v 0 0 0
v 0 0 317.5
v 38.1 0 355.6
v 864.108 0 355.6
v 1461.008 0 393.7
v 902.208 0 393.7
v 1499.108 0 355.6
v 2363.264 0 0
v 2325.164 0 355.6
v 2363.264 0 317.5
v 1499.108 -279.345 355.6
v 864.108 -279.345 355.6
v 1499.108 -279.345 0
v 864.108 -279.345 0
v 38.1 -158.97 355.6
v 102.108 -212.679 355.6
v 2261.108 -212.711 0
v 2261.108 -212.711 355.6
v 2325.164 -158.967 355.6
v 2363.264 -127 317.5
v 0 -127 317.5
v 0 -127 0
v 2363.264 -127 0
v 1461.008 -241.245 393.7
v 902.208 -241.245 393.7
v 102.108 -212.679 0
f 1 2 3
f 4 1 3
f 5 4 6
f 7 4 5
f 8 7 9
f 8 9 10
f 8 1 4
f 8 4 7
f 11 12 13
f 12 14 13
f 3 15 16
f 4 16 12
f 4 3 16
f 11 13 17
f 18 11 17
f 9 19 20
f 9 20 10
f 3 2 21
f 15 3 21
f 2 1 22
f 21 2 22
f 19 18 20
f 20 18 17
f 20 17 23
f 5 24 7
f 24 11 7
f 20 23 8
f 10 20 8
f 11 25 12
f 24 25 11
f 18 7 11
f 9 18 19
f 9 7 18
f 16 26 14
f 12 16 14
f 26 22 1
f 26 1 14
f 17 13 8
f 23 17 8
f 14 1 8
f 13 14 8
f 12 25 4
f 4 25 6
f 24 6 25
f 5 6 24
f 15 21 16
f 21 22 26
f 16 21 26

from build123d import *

# Parameters (mm, degrees)
F1_DEPTH = 355.6
F2_W     = 635
F2_H     = 279.345146747
F3_DEPTH = 38.1
F4_SIZE  = 38.09999
F5_SIZE  = 38.1


# Not quite as in the source:
# - a fillet or chamfer is up to 0.001 mm smaller than in the source, because OpenCascade refuses the exact size


with BuildPart() as f1:
    # F0 (on Top) → F1 (new body)
    with BuildSketch(Plane.XY):
        Polygon((2363.263666194, 0), (0, 0), (0, -127), (102.108, -212.6787851403), (864.108, -279.345146747), (1499.108, -279.345146747), (2261.108, -212.7113899342), (2363.263666194, -127), align=None)
    extrude(amount=F1_DEPTH)

    # F2 (on face) → F3 (join)
    with BuildSketch(Plane.XY.offset(355.6)):
        with Locations((1181.608, -139.6725733735)):
            Rectangle(F2_W, F2_H)
    extrude(amount=F3_DEPTH)

    # F4 (size 38.1 in the source; OpenCascade refuses exactly that, so slightly less here)
    f4_edges = [f1.edges().sort_by_distance(p)[0] for p in [
        (864.108, -139.672573, 393.7),
        (1499.108, -139.672573, 393.7),
    ]]
    chamfer(f4_edges, length=F4_SIZE)

    # F5
    f5_edges = [f1.edges().sort_by_distance(p)[0] for p in [
        (0, -63.5, 355.6),
        (1181.608, -279.345147, 393.7),
        (2363.263666, -63.5, 355.6),
    ]]
    chamfer(f5_edges, length=F5_SIZE)


solid = f1.part
